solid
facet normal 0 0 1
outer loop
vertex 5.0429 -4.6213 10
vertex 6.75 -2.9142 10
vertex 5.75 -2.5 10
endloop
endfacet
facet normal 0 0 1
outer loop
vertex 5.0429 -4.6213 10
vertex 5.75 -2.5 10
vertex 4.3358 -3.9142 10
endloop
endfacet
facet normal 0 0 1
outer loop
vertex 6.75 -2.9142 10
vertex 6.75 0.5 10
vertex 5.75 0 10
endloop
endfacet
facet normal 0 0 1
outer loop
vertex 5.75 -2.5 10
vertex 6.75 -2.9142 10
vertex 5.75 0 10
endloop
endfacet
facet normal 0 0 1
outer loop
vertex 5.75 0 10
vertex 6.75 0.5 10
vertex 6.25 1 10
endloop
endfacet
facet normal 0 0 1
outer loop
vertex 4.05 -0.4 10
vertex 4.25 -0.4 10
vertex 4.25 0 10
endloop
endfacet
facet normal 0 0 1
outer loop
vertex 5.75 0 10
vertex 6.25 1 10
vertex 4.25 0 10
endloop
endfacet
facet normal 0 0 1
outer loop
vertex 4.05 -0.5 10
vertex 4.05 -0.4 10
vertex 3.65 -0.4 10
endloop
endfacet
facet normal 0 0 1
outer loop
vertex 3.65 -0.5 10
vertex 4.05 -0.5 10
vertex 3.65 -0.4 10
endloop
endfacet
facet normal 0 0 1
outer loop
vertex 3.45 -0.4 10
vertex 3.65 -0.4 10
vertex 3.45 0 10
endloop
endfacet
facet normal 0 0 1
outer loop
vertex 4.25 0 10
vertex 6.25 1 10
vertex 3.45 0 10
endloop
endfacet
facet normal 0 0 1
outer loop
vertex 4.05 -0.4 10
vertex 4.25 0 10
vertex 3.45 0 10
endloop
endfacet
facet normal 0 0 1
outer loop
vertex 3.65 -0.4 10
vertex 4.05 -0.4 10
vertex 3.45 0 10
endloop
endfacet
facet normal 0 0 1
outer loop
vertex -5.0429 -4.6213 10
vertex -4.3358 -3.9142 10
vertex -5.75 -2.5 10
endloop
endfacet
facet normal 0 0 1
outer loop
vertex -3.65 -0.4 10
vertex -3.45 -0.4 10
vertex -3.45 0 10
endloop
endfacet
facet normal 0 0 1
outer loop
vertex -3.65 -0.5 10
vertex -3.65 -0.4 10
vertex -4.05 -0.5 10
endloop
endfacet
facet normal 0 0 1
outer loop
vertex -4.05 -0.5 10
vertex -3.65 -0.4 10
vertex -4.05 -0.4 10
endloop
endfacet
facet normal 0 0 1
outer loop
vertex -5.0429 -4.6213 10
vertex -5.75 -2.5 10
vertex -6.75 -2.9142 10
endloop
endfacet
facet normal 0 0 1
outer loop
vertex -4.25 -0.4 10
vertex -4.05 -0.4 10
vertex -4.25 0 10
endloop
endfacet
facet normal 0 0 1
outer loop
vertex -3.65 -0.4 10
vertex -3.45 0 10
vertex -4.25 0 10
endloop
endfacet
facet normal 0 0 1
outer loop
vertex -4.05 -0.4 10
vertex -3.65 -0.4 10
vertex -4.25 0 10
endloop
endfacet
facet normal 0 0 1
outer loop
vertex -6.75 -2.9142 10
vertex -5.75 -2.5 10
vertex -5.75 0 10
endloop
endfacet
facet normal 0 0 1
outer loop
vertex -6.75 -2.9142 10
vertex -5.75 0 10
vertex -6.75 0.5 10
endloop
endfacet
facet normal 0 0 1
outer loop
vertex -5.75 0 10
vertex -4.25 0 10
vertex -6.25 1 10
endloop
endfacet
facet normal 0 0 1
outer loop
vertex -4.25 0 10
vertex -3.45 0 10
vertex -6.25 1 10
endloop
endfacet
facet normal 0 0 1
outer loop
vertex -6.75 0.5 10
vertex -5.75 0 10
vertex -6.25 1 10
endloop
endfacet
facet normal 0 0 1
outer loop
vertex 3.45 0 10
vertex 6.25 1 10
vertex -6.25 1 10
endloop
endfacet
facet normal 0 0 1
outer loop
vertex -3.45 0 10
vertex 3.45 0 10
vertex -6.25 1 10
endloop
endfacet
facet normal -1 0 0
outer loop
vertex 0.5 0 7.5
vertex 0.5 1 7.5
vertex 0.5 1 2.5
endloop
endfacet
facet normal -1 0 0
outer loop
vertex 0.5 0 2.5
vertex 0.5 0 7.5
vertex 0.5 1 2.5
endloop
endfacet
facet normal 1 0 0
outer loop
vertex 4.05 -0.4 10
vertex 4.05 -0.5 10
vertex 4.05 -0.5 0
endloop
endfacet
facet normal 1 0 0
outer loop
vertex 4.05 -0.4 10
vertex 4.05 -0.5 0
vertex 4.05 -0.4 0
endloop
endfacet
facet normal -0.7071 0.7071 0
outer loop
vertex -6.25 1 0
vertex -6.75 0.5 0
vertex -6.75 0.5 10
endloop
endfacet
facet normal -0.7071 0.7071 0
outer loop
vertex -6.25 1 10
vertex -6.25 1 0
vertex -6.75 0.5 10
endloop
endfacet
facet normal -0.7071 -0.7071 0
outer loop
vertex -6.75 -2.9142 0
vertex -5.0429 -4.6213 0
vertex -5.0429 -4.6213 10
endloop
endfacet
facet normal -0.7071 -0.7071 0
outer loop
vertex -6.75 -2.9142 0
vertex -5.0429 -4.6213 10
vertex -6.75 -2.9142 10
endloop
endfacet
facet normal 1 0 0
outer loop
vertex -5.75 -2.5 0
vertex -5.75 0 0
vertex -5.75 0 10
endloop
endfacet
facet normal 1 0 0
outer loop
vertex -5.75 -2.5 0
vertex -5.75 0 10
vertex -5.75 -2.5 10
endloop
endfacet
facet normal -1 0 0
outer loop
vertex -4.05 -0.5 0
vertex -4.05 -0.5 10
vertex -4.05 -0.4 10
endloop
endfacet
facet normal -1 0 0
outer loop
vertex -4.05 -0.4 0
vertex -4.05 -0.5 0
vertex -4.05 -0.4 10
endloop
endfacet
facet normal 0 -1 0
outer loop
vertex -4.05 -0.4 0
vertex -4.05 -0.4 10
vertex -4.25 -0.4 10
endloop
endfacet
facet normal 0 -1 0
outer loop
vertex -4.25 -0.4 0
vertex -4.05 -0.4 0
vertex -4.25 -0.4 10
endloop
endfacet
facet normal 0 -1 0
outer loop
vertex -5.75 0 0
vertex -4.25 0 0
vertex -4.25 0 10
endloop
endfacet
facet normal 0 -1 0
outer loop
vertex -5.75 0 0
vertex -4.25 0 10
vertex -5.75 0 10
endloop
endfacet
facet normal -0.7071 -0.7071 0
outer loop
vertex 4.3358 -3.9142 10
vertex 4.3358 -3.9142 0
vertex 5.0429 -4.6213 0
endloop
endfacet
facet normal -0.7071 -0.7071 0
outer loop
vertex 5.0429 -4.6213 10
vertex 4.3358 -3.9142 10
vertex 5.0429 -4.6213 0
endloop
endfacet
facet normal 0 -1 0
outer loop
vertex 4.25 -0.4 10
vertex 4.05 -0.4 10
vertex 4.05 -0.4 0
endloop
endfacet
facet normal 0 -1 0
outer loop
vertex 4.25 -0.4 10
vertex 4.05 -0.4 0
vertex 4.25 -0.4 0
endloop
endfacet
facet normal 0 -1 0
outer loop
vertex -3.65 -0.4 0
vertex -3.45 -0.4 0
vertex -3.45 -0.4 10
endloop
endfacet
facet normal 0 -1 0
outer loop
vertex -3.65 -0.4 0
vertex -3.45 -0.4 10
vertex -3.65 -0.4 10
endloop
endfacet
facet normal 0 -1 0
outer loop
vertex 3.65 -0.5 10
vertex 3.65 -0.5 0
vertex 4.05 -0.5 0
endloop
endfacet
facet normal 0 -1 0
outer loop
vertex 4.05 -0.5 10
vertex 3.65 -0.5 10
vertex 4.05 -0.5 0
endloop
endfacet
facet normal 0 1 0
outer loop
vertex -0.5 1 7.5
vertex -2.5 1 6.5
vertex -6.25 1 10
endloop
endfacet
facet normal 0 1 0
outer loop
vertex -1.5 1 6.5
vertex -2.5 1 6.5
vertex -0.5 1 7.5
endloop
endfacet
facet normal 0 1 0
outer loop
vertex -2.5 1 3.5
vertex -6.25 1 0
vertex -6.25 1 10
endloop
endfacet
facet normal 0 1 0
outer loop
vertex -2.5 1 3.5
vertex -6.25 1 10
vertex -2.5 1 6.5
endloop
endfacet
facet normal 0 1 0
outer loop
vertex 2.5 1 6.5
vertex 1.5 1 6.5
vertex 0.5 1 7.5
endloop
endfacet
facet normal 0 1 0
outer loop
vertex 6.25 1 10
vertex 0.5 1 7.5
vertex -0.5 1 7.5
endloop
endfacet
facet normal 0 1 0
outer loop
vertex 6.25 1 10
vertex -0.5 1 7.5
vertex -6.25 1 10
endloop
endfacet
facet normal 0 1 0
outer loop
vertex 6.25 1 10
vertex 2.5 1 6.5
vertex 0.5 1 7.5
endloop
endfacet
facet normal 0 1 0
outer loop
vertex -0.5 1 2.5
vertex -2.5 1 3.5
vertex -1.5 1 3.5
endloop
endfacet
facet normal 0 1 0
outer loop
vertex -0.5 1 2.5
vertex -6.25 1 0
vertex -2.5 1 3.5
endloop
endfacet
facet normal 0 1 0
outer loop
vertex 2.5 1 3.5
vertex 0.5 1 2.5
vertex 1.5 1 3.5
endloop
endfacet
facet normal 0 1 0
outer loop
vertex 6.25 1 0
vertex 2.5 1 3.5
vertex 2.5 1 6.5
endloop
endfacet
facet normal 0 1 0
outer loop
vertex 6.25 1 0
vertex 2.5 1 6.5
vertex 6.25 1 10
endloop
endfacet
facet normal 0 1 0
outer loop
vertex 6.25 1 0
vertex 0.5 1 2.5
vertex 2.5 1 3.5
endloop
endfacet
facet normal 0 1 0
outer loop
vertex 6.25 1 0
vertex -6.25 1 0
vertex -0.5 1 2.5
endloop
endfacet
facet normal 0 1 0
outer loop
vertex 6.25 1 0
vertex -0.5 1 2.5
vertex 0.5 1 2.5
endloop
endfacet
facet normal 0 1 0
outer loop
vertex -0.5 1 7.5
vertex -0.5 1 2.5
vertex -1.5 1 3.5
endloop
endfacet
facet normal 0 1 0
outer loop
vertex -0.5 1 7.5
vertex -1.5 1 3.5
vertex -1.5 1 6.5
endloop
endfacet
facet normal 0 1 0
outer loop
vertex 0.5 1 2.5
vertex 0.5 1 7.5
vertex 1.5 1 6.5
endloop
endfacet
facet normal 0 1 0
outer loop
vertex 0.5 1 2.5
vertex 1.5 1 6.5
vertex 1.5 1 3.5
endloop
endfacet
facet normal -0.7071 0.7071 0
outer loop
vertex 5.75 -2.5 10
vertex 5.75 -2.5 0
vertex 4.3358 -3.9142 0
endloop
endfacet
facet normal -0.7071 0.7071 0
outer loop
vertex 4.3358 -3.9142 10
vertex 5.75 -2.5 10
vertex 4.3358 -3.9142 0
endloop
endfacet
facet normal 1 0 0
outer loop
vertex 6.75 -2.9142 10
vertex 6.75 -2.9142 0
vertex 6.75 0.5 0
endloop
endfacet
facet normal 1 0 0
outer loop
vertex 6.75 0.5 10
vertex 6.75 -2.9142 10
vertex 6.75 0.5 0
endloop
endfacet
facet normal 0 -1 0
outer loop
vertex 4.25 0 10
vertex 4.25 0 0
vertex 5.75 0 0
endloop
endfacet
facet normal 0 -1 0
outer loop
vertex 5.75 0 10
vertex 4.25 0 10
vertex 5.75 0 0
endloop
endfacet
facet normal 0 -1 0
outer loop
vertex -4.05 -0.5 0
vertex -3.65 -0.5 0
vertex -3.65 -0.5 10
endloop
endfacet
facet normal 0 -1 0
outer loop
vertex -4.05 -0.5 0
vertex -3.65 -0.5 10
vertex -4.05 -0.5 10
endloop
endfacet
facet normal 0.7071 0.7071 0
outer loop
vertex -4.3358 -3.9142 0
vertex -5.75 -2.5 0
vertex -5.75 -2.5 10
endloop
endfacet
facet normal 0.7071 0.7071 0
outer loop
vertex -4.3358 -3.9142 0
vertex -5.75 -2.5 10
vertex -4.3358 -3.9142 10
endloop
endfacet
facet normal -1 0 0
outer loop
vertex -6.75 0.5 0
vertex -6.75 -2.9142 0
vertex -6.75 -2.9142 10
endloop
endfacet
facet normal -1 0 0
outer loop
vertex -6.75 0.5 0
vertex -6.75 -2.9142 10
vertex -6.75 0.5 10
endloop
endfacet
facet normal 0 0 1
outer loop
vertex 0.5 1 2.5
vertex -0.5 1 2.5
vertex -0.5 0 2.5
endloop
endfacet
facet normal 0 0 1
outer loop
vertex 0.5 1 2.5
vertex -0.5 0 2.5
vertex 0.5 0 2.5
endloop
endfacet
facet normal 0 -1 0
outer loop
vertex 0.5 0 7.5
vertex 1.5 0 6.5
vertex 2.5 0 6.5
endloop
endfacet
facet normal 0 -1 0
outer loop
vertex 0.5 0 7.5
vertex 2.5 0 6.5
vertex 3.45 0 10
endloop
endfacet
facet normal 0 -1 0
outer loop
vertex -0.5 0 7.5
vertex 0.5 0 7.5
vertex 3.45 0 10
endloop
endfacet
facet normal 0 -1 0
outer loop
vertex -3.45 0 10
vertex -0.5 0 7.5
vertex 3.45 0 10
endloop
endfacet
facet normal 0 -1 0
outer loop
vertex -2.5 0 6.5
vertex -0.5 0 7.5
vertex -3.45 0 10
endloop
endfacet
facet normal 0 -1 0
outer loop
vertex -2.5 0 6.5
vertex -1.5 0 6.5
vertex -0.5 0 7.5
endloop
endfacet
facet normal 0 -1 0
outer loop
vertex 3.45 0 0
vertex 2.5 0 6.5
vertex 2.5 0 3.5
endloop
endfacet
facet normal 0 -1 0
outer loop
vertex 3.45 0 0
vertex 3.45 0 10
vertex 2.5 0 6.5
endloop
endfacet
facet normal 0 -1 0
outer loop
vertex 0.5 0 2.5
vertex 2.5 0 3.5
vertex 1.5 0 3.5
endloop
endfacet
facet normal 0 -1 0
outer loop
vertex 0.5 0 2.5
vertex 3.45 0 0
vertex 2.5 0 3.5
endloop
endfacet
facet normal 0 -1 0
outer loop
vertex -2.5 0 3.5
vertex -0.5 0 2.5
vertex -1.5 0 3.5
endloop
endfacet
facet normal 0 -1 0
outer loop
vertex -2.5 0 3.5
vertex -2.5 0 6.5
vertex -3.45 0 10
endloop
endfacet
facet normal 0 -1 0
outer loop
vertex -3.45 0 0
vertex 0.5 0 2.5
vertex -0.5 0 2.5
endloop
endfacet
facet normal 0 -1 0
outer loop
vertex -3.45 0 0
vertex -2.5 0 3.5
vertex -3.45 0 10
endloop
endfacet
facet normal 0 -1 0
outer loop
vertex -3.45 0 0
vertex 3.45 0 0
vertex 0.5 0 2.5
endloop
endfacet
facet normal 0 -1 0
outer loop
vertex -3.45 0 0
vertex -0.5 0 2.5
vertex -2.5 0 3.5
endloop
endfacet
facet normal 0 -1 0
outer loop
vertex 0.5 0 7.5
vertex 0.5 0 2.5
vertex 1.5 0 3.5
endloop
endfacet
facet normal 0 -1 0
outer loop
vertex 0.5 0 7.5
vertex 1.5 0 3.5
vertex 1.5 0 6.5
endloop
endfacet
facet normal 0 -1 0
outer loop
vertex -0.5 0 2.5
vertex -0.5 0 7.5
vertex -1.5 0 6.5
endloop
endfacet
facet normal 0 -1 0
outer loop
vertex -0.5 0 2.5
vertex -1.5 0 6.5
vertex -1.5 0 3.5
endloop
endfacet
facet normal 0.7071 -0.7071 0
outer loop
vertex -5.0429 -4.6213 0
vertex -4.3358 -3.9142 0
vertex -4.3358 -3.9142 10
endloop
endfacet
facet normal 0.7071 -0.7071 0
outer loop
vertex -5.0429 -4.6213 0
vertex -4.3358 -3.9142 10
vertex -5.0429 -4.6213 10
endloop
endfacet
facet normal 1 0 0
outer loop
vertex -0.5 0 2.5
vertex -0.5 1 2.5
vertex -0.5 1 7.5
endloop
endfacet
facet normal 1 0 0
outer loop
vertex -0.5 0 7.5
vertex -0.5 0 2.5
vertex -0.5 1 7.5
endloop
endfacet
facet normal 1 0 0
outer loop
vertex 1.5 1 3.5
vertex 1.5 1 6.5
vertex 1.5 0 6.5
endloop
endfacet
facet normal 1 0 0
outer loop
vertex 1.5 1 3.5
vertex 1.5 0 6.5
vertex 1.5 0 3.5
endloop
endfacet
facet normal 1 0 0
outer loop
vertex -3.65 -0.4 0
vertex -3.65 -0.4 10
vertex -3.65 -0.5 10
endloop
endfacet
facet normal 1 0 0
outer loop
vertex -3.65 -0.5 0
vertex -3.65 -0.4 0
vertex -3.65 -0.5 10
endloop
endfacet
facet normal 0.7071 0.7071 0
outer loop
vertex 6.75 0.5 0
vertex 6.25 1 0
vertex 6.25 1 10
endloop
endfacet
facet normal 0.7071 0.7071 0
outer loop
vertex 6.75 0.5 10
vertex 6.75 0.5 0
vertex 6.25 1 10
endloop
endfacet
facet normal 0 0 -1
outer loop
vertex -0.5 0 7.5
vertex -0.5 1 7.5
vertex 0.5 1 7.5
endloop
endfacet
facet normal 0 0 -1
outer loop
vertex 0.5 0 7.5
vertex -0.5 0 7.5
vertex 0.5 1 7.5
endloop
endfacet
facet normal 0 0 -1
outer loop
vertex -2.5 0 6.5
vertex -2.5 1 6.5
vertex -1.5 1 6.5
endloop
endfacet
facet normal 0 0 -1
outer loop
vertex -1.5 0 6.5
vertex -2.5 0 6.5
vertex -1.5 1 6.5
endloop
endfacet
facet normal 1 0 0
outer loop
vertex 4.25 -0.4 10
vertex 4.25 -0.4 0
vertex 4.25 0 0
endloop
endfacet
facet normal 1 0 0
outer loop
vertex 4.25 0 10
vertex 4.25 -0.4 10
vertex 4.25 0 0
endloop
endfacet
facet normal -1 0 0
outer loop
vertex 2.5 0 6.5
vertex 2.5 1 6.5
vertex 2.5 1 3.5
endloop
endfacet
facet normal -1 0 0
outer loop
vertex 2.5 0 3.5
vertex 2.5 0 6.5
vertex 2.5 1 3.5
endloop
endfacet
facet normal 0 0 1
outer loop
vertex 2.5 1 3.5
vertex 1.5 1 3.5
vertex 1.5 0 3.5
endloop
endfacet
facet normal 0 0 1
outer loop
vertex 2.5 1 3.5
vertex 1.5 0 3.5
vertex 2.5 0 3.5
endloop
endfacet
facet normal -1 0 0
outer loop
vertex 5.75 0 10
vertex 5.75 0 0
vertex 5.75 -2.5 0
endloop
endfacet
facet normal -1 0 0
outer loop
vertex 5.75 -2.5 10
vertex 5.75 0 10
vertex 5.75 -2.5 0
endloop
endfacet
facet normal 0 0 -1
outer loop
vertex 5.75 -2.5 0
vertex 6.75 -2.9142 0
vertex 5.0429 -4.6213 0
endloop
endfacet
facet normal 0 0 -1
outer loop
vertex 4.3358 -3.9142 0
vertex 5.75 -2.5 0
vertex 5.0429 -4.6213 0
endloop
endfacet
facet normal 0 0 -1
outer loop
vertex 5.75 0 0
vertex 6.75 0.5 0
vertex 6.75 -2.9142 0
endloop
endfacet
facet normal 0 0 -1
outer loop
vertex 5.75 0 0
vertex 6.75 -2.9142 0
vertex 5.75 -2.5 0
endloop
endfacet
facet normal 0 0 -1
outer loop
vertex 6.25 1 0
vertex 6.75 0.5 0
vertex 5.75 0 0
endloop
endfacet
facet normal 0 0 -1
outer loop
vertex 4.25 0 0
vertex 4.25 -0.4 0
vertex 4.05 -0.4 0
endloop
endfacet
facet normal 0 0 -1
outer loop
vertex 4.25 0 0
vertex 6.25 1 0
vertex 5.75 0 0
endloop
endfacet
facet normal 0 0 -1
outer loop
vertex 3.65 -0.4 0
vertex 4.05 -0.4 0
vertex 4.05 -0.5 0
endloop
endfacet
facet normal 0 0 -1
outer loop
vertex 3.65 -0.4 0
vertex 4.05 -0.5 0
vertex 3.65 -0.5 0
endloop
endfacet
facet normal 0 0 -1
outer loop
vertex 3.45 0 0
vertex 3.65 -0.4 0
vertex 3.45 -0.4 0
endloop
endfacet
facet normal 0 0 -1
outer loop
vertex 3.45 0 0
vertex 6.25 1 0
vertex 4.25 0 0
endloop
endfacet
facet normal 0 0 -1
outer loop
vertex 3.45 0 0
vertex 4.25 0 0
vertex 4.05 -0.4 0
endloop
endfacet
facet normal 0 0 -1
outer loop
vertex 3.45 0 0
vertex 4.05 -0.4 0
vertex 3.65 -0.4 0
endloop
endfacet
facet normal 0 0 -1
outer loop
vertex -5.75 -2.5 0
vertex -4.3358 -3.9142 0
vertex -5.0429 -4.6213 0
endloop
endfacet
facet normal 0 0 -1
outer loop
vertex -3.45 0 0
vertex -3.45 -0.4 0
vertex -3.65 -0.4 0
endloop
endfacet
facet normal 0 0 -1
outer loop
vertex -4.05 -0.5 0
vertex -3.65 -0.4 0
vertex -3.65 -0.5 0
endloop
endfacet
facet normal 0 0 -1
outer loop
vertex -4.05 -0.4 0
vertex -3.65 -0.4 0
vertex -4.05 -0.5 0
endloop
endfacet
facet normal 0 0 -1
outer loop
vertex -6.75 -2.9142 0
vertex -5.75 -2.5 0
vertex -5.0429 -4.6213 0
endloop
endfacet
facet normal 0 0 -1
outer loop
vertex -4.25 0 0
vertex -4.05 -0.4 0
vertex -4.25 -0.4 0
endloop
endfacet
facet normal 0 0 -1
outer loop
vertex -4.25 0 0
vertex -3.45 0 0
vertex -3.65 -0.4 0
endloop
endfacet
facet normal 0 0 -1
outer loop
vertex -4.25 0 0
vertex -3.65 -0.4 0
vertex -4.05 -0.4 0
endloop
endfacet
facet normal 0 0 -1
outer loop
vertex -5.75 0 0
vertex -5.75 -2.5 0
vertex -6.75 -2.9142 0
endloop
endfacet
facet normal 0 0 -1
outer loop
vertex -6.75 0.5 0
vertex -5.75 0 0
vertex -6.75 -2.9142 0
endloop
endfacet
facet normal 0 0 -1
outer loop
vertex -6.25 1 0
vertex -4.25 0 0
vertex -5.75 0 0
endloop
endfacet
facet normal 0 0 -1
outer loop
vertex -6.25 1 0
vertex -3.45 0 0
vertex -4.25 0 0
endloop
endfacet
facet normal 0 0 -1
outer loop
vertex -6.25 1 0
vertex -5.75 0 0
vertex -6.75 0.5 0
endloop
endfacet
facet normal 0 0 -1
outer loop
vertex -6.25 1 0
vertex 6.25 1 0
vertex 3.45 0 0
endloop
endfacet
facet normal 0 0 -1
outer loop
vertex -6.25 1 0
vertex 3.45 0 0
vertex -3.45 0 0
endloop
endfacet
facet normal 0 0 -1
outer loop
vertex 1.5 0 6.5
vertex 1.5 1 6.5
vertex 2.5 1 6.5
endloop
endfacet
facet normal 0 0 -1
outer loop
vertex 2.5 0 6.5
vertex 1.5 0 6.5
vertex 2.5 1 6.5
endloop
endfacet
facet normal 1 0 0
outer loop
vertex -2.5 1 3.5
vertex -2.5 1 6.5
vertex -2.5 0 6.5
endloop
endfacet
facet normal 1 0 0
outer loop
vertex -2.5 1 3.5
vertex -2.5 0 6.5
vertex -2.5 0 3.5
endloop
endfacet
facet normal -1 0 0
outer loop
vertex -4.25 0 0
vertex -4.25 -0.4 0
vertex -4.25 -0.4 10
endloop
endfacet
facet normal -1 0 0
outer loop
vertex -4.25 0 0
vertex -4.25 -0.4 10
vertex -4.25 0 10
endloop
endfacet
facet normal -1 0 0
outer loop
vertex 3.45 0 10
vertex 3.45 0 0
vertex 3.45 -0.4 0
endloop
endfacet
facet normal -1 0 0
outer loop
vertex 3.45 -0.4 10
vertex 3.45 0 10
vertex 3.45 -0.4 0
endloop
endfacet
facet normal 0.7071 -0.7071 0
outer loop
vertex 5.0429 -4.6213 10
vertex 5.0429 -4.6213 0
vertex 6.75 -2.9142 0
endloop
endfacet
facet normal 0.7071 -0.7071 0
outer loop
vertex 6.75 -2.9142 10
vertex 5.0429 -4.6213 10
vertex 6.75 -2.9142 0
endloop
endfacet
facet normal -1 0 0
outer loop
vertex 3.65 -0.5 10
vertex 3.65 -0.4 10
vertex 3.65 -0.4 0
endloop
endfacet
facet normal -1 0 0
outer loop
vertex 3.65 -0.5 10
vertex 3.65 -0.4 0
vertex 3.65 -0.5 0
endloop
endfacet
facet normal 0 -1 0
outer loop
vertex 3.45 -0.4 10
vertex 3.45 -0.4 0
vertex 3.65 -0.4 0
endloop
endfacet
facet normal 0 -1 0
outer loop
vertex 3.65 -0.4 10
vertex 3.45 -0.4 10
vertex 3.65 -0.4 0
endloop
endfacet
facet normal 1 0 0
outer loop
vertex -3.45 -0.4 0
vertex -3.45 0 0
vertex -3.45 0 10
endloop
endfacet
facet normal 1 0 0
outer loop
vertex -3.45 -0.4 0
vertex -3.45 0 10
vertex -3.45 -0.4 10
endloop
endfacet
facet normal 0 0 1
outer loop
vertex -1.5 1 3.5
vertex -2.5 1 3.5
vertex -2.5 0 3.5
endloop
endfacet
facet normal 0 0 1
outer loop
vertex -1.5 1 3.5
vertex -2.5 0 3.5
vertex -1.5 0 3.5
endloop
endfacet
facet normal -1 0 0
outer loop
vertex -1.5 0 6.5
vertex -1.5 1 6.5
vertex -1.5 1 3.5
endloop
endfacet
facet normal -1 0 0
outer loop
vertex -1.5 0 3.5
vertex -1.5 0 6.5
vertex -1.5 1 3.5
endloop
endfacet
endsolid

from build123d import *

# Parameters (mm, degrees)
BOSS_EXTRUDE1_DEPTH = 10
CHAMFER1_SIZE       = 0.5
SKETCH7_W           = 1
SKETCH7_H           = 3
SKETCH7_H_2         = 1
CUT_EXTRUDE1_DEPTH  = 14.310211959


with BuildPart() as part:
    # Sketch2 → Boss-Extrude1 (new body)
    with BuildSketch(Plane.XY):
        Polygon((4.25, 0), (5.75, 0), (5.75, -2.5), (4.335786438, -3.914213562), (5.042893219, -4.621320344), (6.75, -2.914213562), (6.75, 1), (0, 1), (0, 0), (3.45, 0), (3.45, -0.4), (3.65, -0.4), (3.65, -0.5), (4.05, -0.5), (4.05, -0.4), (4.25, -0.4), align=None)
    boss_extrude1 = extrude(amount=BOSS_EXTRUDE1_DEPTH)

    # Mirror1: Boss-Extrude1 across plane
    add(boss_extrude1.mirror(Plane(origin=(0, 0, 0), x_dir=(0, 0, 1), z_dir=(1, 0, 0))))

    # Chamfer1
    chamfer1_edges = [part.edges().sort_by_distance(p)[0] for p in [
        (6.75, 1, 5),
        (-6.75, 1, 5),
    ]]
    chamfer(chamfer1_edges, length=CHAMFER1_SIZE)

    # Sketch7 → Cut-Extrude1 (cut, through all)
    with BuildSketch(Plane(origin=(0, 1, 0), x_dir=(1, 0, 0), z_dir=(0, 1, 0))):
        with Locations((0, -5)):
            Rectangle(SKETCH7_W, SKETCH7_H)
        with Locations((0, -3)):
            Rectangle(SKETCH7_W, SKETCH7_H_2)
        with Locations((0, -7)):
            Rectangle(SKETCH7_W, SKETCH7_H_2)
        with Locations((2, -5)):
            Rectangle(SKETCH7_W, SKETCH7_H)
        with Locations((-2, -5)):
            Rectangle(SKETCH7_W, SKETCH7_H)
    extrude(amount=-CUT_EXTRUDE1_DEPTH, mode=Mode.SUBTRACT)


solid = part.part
